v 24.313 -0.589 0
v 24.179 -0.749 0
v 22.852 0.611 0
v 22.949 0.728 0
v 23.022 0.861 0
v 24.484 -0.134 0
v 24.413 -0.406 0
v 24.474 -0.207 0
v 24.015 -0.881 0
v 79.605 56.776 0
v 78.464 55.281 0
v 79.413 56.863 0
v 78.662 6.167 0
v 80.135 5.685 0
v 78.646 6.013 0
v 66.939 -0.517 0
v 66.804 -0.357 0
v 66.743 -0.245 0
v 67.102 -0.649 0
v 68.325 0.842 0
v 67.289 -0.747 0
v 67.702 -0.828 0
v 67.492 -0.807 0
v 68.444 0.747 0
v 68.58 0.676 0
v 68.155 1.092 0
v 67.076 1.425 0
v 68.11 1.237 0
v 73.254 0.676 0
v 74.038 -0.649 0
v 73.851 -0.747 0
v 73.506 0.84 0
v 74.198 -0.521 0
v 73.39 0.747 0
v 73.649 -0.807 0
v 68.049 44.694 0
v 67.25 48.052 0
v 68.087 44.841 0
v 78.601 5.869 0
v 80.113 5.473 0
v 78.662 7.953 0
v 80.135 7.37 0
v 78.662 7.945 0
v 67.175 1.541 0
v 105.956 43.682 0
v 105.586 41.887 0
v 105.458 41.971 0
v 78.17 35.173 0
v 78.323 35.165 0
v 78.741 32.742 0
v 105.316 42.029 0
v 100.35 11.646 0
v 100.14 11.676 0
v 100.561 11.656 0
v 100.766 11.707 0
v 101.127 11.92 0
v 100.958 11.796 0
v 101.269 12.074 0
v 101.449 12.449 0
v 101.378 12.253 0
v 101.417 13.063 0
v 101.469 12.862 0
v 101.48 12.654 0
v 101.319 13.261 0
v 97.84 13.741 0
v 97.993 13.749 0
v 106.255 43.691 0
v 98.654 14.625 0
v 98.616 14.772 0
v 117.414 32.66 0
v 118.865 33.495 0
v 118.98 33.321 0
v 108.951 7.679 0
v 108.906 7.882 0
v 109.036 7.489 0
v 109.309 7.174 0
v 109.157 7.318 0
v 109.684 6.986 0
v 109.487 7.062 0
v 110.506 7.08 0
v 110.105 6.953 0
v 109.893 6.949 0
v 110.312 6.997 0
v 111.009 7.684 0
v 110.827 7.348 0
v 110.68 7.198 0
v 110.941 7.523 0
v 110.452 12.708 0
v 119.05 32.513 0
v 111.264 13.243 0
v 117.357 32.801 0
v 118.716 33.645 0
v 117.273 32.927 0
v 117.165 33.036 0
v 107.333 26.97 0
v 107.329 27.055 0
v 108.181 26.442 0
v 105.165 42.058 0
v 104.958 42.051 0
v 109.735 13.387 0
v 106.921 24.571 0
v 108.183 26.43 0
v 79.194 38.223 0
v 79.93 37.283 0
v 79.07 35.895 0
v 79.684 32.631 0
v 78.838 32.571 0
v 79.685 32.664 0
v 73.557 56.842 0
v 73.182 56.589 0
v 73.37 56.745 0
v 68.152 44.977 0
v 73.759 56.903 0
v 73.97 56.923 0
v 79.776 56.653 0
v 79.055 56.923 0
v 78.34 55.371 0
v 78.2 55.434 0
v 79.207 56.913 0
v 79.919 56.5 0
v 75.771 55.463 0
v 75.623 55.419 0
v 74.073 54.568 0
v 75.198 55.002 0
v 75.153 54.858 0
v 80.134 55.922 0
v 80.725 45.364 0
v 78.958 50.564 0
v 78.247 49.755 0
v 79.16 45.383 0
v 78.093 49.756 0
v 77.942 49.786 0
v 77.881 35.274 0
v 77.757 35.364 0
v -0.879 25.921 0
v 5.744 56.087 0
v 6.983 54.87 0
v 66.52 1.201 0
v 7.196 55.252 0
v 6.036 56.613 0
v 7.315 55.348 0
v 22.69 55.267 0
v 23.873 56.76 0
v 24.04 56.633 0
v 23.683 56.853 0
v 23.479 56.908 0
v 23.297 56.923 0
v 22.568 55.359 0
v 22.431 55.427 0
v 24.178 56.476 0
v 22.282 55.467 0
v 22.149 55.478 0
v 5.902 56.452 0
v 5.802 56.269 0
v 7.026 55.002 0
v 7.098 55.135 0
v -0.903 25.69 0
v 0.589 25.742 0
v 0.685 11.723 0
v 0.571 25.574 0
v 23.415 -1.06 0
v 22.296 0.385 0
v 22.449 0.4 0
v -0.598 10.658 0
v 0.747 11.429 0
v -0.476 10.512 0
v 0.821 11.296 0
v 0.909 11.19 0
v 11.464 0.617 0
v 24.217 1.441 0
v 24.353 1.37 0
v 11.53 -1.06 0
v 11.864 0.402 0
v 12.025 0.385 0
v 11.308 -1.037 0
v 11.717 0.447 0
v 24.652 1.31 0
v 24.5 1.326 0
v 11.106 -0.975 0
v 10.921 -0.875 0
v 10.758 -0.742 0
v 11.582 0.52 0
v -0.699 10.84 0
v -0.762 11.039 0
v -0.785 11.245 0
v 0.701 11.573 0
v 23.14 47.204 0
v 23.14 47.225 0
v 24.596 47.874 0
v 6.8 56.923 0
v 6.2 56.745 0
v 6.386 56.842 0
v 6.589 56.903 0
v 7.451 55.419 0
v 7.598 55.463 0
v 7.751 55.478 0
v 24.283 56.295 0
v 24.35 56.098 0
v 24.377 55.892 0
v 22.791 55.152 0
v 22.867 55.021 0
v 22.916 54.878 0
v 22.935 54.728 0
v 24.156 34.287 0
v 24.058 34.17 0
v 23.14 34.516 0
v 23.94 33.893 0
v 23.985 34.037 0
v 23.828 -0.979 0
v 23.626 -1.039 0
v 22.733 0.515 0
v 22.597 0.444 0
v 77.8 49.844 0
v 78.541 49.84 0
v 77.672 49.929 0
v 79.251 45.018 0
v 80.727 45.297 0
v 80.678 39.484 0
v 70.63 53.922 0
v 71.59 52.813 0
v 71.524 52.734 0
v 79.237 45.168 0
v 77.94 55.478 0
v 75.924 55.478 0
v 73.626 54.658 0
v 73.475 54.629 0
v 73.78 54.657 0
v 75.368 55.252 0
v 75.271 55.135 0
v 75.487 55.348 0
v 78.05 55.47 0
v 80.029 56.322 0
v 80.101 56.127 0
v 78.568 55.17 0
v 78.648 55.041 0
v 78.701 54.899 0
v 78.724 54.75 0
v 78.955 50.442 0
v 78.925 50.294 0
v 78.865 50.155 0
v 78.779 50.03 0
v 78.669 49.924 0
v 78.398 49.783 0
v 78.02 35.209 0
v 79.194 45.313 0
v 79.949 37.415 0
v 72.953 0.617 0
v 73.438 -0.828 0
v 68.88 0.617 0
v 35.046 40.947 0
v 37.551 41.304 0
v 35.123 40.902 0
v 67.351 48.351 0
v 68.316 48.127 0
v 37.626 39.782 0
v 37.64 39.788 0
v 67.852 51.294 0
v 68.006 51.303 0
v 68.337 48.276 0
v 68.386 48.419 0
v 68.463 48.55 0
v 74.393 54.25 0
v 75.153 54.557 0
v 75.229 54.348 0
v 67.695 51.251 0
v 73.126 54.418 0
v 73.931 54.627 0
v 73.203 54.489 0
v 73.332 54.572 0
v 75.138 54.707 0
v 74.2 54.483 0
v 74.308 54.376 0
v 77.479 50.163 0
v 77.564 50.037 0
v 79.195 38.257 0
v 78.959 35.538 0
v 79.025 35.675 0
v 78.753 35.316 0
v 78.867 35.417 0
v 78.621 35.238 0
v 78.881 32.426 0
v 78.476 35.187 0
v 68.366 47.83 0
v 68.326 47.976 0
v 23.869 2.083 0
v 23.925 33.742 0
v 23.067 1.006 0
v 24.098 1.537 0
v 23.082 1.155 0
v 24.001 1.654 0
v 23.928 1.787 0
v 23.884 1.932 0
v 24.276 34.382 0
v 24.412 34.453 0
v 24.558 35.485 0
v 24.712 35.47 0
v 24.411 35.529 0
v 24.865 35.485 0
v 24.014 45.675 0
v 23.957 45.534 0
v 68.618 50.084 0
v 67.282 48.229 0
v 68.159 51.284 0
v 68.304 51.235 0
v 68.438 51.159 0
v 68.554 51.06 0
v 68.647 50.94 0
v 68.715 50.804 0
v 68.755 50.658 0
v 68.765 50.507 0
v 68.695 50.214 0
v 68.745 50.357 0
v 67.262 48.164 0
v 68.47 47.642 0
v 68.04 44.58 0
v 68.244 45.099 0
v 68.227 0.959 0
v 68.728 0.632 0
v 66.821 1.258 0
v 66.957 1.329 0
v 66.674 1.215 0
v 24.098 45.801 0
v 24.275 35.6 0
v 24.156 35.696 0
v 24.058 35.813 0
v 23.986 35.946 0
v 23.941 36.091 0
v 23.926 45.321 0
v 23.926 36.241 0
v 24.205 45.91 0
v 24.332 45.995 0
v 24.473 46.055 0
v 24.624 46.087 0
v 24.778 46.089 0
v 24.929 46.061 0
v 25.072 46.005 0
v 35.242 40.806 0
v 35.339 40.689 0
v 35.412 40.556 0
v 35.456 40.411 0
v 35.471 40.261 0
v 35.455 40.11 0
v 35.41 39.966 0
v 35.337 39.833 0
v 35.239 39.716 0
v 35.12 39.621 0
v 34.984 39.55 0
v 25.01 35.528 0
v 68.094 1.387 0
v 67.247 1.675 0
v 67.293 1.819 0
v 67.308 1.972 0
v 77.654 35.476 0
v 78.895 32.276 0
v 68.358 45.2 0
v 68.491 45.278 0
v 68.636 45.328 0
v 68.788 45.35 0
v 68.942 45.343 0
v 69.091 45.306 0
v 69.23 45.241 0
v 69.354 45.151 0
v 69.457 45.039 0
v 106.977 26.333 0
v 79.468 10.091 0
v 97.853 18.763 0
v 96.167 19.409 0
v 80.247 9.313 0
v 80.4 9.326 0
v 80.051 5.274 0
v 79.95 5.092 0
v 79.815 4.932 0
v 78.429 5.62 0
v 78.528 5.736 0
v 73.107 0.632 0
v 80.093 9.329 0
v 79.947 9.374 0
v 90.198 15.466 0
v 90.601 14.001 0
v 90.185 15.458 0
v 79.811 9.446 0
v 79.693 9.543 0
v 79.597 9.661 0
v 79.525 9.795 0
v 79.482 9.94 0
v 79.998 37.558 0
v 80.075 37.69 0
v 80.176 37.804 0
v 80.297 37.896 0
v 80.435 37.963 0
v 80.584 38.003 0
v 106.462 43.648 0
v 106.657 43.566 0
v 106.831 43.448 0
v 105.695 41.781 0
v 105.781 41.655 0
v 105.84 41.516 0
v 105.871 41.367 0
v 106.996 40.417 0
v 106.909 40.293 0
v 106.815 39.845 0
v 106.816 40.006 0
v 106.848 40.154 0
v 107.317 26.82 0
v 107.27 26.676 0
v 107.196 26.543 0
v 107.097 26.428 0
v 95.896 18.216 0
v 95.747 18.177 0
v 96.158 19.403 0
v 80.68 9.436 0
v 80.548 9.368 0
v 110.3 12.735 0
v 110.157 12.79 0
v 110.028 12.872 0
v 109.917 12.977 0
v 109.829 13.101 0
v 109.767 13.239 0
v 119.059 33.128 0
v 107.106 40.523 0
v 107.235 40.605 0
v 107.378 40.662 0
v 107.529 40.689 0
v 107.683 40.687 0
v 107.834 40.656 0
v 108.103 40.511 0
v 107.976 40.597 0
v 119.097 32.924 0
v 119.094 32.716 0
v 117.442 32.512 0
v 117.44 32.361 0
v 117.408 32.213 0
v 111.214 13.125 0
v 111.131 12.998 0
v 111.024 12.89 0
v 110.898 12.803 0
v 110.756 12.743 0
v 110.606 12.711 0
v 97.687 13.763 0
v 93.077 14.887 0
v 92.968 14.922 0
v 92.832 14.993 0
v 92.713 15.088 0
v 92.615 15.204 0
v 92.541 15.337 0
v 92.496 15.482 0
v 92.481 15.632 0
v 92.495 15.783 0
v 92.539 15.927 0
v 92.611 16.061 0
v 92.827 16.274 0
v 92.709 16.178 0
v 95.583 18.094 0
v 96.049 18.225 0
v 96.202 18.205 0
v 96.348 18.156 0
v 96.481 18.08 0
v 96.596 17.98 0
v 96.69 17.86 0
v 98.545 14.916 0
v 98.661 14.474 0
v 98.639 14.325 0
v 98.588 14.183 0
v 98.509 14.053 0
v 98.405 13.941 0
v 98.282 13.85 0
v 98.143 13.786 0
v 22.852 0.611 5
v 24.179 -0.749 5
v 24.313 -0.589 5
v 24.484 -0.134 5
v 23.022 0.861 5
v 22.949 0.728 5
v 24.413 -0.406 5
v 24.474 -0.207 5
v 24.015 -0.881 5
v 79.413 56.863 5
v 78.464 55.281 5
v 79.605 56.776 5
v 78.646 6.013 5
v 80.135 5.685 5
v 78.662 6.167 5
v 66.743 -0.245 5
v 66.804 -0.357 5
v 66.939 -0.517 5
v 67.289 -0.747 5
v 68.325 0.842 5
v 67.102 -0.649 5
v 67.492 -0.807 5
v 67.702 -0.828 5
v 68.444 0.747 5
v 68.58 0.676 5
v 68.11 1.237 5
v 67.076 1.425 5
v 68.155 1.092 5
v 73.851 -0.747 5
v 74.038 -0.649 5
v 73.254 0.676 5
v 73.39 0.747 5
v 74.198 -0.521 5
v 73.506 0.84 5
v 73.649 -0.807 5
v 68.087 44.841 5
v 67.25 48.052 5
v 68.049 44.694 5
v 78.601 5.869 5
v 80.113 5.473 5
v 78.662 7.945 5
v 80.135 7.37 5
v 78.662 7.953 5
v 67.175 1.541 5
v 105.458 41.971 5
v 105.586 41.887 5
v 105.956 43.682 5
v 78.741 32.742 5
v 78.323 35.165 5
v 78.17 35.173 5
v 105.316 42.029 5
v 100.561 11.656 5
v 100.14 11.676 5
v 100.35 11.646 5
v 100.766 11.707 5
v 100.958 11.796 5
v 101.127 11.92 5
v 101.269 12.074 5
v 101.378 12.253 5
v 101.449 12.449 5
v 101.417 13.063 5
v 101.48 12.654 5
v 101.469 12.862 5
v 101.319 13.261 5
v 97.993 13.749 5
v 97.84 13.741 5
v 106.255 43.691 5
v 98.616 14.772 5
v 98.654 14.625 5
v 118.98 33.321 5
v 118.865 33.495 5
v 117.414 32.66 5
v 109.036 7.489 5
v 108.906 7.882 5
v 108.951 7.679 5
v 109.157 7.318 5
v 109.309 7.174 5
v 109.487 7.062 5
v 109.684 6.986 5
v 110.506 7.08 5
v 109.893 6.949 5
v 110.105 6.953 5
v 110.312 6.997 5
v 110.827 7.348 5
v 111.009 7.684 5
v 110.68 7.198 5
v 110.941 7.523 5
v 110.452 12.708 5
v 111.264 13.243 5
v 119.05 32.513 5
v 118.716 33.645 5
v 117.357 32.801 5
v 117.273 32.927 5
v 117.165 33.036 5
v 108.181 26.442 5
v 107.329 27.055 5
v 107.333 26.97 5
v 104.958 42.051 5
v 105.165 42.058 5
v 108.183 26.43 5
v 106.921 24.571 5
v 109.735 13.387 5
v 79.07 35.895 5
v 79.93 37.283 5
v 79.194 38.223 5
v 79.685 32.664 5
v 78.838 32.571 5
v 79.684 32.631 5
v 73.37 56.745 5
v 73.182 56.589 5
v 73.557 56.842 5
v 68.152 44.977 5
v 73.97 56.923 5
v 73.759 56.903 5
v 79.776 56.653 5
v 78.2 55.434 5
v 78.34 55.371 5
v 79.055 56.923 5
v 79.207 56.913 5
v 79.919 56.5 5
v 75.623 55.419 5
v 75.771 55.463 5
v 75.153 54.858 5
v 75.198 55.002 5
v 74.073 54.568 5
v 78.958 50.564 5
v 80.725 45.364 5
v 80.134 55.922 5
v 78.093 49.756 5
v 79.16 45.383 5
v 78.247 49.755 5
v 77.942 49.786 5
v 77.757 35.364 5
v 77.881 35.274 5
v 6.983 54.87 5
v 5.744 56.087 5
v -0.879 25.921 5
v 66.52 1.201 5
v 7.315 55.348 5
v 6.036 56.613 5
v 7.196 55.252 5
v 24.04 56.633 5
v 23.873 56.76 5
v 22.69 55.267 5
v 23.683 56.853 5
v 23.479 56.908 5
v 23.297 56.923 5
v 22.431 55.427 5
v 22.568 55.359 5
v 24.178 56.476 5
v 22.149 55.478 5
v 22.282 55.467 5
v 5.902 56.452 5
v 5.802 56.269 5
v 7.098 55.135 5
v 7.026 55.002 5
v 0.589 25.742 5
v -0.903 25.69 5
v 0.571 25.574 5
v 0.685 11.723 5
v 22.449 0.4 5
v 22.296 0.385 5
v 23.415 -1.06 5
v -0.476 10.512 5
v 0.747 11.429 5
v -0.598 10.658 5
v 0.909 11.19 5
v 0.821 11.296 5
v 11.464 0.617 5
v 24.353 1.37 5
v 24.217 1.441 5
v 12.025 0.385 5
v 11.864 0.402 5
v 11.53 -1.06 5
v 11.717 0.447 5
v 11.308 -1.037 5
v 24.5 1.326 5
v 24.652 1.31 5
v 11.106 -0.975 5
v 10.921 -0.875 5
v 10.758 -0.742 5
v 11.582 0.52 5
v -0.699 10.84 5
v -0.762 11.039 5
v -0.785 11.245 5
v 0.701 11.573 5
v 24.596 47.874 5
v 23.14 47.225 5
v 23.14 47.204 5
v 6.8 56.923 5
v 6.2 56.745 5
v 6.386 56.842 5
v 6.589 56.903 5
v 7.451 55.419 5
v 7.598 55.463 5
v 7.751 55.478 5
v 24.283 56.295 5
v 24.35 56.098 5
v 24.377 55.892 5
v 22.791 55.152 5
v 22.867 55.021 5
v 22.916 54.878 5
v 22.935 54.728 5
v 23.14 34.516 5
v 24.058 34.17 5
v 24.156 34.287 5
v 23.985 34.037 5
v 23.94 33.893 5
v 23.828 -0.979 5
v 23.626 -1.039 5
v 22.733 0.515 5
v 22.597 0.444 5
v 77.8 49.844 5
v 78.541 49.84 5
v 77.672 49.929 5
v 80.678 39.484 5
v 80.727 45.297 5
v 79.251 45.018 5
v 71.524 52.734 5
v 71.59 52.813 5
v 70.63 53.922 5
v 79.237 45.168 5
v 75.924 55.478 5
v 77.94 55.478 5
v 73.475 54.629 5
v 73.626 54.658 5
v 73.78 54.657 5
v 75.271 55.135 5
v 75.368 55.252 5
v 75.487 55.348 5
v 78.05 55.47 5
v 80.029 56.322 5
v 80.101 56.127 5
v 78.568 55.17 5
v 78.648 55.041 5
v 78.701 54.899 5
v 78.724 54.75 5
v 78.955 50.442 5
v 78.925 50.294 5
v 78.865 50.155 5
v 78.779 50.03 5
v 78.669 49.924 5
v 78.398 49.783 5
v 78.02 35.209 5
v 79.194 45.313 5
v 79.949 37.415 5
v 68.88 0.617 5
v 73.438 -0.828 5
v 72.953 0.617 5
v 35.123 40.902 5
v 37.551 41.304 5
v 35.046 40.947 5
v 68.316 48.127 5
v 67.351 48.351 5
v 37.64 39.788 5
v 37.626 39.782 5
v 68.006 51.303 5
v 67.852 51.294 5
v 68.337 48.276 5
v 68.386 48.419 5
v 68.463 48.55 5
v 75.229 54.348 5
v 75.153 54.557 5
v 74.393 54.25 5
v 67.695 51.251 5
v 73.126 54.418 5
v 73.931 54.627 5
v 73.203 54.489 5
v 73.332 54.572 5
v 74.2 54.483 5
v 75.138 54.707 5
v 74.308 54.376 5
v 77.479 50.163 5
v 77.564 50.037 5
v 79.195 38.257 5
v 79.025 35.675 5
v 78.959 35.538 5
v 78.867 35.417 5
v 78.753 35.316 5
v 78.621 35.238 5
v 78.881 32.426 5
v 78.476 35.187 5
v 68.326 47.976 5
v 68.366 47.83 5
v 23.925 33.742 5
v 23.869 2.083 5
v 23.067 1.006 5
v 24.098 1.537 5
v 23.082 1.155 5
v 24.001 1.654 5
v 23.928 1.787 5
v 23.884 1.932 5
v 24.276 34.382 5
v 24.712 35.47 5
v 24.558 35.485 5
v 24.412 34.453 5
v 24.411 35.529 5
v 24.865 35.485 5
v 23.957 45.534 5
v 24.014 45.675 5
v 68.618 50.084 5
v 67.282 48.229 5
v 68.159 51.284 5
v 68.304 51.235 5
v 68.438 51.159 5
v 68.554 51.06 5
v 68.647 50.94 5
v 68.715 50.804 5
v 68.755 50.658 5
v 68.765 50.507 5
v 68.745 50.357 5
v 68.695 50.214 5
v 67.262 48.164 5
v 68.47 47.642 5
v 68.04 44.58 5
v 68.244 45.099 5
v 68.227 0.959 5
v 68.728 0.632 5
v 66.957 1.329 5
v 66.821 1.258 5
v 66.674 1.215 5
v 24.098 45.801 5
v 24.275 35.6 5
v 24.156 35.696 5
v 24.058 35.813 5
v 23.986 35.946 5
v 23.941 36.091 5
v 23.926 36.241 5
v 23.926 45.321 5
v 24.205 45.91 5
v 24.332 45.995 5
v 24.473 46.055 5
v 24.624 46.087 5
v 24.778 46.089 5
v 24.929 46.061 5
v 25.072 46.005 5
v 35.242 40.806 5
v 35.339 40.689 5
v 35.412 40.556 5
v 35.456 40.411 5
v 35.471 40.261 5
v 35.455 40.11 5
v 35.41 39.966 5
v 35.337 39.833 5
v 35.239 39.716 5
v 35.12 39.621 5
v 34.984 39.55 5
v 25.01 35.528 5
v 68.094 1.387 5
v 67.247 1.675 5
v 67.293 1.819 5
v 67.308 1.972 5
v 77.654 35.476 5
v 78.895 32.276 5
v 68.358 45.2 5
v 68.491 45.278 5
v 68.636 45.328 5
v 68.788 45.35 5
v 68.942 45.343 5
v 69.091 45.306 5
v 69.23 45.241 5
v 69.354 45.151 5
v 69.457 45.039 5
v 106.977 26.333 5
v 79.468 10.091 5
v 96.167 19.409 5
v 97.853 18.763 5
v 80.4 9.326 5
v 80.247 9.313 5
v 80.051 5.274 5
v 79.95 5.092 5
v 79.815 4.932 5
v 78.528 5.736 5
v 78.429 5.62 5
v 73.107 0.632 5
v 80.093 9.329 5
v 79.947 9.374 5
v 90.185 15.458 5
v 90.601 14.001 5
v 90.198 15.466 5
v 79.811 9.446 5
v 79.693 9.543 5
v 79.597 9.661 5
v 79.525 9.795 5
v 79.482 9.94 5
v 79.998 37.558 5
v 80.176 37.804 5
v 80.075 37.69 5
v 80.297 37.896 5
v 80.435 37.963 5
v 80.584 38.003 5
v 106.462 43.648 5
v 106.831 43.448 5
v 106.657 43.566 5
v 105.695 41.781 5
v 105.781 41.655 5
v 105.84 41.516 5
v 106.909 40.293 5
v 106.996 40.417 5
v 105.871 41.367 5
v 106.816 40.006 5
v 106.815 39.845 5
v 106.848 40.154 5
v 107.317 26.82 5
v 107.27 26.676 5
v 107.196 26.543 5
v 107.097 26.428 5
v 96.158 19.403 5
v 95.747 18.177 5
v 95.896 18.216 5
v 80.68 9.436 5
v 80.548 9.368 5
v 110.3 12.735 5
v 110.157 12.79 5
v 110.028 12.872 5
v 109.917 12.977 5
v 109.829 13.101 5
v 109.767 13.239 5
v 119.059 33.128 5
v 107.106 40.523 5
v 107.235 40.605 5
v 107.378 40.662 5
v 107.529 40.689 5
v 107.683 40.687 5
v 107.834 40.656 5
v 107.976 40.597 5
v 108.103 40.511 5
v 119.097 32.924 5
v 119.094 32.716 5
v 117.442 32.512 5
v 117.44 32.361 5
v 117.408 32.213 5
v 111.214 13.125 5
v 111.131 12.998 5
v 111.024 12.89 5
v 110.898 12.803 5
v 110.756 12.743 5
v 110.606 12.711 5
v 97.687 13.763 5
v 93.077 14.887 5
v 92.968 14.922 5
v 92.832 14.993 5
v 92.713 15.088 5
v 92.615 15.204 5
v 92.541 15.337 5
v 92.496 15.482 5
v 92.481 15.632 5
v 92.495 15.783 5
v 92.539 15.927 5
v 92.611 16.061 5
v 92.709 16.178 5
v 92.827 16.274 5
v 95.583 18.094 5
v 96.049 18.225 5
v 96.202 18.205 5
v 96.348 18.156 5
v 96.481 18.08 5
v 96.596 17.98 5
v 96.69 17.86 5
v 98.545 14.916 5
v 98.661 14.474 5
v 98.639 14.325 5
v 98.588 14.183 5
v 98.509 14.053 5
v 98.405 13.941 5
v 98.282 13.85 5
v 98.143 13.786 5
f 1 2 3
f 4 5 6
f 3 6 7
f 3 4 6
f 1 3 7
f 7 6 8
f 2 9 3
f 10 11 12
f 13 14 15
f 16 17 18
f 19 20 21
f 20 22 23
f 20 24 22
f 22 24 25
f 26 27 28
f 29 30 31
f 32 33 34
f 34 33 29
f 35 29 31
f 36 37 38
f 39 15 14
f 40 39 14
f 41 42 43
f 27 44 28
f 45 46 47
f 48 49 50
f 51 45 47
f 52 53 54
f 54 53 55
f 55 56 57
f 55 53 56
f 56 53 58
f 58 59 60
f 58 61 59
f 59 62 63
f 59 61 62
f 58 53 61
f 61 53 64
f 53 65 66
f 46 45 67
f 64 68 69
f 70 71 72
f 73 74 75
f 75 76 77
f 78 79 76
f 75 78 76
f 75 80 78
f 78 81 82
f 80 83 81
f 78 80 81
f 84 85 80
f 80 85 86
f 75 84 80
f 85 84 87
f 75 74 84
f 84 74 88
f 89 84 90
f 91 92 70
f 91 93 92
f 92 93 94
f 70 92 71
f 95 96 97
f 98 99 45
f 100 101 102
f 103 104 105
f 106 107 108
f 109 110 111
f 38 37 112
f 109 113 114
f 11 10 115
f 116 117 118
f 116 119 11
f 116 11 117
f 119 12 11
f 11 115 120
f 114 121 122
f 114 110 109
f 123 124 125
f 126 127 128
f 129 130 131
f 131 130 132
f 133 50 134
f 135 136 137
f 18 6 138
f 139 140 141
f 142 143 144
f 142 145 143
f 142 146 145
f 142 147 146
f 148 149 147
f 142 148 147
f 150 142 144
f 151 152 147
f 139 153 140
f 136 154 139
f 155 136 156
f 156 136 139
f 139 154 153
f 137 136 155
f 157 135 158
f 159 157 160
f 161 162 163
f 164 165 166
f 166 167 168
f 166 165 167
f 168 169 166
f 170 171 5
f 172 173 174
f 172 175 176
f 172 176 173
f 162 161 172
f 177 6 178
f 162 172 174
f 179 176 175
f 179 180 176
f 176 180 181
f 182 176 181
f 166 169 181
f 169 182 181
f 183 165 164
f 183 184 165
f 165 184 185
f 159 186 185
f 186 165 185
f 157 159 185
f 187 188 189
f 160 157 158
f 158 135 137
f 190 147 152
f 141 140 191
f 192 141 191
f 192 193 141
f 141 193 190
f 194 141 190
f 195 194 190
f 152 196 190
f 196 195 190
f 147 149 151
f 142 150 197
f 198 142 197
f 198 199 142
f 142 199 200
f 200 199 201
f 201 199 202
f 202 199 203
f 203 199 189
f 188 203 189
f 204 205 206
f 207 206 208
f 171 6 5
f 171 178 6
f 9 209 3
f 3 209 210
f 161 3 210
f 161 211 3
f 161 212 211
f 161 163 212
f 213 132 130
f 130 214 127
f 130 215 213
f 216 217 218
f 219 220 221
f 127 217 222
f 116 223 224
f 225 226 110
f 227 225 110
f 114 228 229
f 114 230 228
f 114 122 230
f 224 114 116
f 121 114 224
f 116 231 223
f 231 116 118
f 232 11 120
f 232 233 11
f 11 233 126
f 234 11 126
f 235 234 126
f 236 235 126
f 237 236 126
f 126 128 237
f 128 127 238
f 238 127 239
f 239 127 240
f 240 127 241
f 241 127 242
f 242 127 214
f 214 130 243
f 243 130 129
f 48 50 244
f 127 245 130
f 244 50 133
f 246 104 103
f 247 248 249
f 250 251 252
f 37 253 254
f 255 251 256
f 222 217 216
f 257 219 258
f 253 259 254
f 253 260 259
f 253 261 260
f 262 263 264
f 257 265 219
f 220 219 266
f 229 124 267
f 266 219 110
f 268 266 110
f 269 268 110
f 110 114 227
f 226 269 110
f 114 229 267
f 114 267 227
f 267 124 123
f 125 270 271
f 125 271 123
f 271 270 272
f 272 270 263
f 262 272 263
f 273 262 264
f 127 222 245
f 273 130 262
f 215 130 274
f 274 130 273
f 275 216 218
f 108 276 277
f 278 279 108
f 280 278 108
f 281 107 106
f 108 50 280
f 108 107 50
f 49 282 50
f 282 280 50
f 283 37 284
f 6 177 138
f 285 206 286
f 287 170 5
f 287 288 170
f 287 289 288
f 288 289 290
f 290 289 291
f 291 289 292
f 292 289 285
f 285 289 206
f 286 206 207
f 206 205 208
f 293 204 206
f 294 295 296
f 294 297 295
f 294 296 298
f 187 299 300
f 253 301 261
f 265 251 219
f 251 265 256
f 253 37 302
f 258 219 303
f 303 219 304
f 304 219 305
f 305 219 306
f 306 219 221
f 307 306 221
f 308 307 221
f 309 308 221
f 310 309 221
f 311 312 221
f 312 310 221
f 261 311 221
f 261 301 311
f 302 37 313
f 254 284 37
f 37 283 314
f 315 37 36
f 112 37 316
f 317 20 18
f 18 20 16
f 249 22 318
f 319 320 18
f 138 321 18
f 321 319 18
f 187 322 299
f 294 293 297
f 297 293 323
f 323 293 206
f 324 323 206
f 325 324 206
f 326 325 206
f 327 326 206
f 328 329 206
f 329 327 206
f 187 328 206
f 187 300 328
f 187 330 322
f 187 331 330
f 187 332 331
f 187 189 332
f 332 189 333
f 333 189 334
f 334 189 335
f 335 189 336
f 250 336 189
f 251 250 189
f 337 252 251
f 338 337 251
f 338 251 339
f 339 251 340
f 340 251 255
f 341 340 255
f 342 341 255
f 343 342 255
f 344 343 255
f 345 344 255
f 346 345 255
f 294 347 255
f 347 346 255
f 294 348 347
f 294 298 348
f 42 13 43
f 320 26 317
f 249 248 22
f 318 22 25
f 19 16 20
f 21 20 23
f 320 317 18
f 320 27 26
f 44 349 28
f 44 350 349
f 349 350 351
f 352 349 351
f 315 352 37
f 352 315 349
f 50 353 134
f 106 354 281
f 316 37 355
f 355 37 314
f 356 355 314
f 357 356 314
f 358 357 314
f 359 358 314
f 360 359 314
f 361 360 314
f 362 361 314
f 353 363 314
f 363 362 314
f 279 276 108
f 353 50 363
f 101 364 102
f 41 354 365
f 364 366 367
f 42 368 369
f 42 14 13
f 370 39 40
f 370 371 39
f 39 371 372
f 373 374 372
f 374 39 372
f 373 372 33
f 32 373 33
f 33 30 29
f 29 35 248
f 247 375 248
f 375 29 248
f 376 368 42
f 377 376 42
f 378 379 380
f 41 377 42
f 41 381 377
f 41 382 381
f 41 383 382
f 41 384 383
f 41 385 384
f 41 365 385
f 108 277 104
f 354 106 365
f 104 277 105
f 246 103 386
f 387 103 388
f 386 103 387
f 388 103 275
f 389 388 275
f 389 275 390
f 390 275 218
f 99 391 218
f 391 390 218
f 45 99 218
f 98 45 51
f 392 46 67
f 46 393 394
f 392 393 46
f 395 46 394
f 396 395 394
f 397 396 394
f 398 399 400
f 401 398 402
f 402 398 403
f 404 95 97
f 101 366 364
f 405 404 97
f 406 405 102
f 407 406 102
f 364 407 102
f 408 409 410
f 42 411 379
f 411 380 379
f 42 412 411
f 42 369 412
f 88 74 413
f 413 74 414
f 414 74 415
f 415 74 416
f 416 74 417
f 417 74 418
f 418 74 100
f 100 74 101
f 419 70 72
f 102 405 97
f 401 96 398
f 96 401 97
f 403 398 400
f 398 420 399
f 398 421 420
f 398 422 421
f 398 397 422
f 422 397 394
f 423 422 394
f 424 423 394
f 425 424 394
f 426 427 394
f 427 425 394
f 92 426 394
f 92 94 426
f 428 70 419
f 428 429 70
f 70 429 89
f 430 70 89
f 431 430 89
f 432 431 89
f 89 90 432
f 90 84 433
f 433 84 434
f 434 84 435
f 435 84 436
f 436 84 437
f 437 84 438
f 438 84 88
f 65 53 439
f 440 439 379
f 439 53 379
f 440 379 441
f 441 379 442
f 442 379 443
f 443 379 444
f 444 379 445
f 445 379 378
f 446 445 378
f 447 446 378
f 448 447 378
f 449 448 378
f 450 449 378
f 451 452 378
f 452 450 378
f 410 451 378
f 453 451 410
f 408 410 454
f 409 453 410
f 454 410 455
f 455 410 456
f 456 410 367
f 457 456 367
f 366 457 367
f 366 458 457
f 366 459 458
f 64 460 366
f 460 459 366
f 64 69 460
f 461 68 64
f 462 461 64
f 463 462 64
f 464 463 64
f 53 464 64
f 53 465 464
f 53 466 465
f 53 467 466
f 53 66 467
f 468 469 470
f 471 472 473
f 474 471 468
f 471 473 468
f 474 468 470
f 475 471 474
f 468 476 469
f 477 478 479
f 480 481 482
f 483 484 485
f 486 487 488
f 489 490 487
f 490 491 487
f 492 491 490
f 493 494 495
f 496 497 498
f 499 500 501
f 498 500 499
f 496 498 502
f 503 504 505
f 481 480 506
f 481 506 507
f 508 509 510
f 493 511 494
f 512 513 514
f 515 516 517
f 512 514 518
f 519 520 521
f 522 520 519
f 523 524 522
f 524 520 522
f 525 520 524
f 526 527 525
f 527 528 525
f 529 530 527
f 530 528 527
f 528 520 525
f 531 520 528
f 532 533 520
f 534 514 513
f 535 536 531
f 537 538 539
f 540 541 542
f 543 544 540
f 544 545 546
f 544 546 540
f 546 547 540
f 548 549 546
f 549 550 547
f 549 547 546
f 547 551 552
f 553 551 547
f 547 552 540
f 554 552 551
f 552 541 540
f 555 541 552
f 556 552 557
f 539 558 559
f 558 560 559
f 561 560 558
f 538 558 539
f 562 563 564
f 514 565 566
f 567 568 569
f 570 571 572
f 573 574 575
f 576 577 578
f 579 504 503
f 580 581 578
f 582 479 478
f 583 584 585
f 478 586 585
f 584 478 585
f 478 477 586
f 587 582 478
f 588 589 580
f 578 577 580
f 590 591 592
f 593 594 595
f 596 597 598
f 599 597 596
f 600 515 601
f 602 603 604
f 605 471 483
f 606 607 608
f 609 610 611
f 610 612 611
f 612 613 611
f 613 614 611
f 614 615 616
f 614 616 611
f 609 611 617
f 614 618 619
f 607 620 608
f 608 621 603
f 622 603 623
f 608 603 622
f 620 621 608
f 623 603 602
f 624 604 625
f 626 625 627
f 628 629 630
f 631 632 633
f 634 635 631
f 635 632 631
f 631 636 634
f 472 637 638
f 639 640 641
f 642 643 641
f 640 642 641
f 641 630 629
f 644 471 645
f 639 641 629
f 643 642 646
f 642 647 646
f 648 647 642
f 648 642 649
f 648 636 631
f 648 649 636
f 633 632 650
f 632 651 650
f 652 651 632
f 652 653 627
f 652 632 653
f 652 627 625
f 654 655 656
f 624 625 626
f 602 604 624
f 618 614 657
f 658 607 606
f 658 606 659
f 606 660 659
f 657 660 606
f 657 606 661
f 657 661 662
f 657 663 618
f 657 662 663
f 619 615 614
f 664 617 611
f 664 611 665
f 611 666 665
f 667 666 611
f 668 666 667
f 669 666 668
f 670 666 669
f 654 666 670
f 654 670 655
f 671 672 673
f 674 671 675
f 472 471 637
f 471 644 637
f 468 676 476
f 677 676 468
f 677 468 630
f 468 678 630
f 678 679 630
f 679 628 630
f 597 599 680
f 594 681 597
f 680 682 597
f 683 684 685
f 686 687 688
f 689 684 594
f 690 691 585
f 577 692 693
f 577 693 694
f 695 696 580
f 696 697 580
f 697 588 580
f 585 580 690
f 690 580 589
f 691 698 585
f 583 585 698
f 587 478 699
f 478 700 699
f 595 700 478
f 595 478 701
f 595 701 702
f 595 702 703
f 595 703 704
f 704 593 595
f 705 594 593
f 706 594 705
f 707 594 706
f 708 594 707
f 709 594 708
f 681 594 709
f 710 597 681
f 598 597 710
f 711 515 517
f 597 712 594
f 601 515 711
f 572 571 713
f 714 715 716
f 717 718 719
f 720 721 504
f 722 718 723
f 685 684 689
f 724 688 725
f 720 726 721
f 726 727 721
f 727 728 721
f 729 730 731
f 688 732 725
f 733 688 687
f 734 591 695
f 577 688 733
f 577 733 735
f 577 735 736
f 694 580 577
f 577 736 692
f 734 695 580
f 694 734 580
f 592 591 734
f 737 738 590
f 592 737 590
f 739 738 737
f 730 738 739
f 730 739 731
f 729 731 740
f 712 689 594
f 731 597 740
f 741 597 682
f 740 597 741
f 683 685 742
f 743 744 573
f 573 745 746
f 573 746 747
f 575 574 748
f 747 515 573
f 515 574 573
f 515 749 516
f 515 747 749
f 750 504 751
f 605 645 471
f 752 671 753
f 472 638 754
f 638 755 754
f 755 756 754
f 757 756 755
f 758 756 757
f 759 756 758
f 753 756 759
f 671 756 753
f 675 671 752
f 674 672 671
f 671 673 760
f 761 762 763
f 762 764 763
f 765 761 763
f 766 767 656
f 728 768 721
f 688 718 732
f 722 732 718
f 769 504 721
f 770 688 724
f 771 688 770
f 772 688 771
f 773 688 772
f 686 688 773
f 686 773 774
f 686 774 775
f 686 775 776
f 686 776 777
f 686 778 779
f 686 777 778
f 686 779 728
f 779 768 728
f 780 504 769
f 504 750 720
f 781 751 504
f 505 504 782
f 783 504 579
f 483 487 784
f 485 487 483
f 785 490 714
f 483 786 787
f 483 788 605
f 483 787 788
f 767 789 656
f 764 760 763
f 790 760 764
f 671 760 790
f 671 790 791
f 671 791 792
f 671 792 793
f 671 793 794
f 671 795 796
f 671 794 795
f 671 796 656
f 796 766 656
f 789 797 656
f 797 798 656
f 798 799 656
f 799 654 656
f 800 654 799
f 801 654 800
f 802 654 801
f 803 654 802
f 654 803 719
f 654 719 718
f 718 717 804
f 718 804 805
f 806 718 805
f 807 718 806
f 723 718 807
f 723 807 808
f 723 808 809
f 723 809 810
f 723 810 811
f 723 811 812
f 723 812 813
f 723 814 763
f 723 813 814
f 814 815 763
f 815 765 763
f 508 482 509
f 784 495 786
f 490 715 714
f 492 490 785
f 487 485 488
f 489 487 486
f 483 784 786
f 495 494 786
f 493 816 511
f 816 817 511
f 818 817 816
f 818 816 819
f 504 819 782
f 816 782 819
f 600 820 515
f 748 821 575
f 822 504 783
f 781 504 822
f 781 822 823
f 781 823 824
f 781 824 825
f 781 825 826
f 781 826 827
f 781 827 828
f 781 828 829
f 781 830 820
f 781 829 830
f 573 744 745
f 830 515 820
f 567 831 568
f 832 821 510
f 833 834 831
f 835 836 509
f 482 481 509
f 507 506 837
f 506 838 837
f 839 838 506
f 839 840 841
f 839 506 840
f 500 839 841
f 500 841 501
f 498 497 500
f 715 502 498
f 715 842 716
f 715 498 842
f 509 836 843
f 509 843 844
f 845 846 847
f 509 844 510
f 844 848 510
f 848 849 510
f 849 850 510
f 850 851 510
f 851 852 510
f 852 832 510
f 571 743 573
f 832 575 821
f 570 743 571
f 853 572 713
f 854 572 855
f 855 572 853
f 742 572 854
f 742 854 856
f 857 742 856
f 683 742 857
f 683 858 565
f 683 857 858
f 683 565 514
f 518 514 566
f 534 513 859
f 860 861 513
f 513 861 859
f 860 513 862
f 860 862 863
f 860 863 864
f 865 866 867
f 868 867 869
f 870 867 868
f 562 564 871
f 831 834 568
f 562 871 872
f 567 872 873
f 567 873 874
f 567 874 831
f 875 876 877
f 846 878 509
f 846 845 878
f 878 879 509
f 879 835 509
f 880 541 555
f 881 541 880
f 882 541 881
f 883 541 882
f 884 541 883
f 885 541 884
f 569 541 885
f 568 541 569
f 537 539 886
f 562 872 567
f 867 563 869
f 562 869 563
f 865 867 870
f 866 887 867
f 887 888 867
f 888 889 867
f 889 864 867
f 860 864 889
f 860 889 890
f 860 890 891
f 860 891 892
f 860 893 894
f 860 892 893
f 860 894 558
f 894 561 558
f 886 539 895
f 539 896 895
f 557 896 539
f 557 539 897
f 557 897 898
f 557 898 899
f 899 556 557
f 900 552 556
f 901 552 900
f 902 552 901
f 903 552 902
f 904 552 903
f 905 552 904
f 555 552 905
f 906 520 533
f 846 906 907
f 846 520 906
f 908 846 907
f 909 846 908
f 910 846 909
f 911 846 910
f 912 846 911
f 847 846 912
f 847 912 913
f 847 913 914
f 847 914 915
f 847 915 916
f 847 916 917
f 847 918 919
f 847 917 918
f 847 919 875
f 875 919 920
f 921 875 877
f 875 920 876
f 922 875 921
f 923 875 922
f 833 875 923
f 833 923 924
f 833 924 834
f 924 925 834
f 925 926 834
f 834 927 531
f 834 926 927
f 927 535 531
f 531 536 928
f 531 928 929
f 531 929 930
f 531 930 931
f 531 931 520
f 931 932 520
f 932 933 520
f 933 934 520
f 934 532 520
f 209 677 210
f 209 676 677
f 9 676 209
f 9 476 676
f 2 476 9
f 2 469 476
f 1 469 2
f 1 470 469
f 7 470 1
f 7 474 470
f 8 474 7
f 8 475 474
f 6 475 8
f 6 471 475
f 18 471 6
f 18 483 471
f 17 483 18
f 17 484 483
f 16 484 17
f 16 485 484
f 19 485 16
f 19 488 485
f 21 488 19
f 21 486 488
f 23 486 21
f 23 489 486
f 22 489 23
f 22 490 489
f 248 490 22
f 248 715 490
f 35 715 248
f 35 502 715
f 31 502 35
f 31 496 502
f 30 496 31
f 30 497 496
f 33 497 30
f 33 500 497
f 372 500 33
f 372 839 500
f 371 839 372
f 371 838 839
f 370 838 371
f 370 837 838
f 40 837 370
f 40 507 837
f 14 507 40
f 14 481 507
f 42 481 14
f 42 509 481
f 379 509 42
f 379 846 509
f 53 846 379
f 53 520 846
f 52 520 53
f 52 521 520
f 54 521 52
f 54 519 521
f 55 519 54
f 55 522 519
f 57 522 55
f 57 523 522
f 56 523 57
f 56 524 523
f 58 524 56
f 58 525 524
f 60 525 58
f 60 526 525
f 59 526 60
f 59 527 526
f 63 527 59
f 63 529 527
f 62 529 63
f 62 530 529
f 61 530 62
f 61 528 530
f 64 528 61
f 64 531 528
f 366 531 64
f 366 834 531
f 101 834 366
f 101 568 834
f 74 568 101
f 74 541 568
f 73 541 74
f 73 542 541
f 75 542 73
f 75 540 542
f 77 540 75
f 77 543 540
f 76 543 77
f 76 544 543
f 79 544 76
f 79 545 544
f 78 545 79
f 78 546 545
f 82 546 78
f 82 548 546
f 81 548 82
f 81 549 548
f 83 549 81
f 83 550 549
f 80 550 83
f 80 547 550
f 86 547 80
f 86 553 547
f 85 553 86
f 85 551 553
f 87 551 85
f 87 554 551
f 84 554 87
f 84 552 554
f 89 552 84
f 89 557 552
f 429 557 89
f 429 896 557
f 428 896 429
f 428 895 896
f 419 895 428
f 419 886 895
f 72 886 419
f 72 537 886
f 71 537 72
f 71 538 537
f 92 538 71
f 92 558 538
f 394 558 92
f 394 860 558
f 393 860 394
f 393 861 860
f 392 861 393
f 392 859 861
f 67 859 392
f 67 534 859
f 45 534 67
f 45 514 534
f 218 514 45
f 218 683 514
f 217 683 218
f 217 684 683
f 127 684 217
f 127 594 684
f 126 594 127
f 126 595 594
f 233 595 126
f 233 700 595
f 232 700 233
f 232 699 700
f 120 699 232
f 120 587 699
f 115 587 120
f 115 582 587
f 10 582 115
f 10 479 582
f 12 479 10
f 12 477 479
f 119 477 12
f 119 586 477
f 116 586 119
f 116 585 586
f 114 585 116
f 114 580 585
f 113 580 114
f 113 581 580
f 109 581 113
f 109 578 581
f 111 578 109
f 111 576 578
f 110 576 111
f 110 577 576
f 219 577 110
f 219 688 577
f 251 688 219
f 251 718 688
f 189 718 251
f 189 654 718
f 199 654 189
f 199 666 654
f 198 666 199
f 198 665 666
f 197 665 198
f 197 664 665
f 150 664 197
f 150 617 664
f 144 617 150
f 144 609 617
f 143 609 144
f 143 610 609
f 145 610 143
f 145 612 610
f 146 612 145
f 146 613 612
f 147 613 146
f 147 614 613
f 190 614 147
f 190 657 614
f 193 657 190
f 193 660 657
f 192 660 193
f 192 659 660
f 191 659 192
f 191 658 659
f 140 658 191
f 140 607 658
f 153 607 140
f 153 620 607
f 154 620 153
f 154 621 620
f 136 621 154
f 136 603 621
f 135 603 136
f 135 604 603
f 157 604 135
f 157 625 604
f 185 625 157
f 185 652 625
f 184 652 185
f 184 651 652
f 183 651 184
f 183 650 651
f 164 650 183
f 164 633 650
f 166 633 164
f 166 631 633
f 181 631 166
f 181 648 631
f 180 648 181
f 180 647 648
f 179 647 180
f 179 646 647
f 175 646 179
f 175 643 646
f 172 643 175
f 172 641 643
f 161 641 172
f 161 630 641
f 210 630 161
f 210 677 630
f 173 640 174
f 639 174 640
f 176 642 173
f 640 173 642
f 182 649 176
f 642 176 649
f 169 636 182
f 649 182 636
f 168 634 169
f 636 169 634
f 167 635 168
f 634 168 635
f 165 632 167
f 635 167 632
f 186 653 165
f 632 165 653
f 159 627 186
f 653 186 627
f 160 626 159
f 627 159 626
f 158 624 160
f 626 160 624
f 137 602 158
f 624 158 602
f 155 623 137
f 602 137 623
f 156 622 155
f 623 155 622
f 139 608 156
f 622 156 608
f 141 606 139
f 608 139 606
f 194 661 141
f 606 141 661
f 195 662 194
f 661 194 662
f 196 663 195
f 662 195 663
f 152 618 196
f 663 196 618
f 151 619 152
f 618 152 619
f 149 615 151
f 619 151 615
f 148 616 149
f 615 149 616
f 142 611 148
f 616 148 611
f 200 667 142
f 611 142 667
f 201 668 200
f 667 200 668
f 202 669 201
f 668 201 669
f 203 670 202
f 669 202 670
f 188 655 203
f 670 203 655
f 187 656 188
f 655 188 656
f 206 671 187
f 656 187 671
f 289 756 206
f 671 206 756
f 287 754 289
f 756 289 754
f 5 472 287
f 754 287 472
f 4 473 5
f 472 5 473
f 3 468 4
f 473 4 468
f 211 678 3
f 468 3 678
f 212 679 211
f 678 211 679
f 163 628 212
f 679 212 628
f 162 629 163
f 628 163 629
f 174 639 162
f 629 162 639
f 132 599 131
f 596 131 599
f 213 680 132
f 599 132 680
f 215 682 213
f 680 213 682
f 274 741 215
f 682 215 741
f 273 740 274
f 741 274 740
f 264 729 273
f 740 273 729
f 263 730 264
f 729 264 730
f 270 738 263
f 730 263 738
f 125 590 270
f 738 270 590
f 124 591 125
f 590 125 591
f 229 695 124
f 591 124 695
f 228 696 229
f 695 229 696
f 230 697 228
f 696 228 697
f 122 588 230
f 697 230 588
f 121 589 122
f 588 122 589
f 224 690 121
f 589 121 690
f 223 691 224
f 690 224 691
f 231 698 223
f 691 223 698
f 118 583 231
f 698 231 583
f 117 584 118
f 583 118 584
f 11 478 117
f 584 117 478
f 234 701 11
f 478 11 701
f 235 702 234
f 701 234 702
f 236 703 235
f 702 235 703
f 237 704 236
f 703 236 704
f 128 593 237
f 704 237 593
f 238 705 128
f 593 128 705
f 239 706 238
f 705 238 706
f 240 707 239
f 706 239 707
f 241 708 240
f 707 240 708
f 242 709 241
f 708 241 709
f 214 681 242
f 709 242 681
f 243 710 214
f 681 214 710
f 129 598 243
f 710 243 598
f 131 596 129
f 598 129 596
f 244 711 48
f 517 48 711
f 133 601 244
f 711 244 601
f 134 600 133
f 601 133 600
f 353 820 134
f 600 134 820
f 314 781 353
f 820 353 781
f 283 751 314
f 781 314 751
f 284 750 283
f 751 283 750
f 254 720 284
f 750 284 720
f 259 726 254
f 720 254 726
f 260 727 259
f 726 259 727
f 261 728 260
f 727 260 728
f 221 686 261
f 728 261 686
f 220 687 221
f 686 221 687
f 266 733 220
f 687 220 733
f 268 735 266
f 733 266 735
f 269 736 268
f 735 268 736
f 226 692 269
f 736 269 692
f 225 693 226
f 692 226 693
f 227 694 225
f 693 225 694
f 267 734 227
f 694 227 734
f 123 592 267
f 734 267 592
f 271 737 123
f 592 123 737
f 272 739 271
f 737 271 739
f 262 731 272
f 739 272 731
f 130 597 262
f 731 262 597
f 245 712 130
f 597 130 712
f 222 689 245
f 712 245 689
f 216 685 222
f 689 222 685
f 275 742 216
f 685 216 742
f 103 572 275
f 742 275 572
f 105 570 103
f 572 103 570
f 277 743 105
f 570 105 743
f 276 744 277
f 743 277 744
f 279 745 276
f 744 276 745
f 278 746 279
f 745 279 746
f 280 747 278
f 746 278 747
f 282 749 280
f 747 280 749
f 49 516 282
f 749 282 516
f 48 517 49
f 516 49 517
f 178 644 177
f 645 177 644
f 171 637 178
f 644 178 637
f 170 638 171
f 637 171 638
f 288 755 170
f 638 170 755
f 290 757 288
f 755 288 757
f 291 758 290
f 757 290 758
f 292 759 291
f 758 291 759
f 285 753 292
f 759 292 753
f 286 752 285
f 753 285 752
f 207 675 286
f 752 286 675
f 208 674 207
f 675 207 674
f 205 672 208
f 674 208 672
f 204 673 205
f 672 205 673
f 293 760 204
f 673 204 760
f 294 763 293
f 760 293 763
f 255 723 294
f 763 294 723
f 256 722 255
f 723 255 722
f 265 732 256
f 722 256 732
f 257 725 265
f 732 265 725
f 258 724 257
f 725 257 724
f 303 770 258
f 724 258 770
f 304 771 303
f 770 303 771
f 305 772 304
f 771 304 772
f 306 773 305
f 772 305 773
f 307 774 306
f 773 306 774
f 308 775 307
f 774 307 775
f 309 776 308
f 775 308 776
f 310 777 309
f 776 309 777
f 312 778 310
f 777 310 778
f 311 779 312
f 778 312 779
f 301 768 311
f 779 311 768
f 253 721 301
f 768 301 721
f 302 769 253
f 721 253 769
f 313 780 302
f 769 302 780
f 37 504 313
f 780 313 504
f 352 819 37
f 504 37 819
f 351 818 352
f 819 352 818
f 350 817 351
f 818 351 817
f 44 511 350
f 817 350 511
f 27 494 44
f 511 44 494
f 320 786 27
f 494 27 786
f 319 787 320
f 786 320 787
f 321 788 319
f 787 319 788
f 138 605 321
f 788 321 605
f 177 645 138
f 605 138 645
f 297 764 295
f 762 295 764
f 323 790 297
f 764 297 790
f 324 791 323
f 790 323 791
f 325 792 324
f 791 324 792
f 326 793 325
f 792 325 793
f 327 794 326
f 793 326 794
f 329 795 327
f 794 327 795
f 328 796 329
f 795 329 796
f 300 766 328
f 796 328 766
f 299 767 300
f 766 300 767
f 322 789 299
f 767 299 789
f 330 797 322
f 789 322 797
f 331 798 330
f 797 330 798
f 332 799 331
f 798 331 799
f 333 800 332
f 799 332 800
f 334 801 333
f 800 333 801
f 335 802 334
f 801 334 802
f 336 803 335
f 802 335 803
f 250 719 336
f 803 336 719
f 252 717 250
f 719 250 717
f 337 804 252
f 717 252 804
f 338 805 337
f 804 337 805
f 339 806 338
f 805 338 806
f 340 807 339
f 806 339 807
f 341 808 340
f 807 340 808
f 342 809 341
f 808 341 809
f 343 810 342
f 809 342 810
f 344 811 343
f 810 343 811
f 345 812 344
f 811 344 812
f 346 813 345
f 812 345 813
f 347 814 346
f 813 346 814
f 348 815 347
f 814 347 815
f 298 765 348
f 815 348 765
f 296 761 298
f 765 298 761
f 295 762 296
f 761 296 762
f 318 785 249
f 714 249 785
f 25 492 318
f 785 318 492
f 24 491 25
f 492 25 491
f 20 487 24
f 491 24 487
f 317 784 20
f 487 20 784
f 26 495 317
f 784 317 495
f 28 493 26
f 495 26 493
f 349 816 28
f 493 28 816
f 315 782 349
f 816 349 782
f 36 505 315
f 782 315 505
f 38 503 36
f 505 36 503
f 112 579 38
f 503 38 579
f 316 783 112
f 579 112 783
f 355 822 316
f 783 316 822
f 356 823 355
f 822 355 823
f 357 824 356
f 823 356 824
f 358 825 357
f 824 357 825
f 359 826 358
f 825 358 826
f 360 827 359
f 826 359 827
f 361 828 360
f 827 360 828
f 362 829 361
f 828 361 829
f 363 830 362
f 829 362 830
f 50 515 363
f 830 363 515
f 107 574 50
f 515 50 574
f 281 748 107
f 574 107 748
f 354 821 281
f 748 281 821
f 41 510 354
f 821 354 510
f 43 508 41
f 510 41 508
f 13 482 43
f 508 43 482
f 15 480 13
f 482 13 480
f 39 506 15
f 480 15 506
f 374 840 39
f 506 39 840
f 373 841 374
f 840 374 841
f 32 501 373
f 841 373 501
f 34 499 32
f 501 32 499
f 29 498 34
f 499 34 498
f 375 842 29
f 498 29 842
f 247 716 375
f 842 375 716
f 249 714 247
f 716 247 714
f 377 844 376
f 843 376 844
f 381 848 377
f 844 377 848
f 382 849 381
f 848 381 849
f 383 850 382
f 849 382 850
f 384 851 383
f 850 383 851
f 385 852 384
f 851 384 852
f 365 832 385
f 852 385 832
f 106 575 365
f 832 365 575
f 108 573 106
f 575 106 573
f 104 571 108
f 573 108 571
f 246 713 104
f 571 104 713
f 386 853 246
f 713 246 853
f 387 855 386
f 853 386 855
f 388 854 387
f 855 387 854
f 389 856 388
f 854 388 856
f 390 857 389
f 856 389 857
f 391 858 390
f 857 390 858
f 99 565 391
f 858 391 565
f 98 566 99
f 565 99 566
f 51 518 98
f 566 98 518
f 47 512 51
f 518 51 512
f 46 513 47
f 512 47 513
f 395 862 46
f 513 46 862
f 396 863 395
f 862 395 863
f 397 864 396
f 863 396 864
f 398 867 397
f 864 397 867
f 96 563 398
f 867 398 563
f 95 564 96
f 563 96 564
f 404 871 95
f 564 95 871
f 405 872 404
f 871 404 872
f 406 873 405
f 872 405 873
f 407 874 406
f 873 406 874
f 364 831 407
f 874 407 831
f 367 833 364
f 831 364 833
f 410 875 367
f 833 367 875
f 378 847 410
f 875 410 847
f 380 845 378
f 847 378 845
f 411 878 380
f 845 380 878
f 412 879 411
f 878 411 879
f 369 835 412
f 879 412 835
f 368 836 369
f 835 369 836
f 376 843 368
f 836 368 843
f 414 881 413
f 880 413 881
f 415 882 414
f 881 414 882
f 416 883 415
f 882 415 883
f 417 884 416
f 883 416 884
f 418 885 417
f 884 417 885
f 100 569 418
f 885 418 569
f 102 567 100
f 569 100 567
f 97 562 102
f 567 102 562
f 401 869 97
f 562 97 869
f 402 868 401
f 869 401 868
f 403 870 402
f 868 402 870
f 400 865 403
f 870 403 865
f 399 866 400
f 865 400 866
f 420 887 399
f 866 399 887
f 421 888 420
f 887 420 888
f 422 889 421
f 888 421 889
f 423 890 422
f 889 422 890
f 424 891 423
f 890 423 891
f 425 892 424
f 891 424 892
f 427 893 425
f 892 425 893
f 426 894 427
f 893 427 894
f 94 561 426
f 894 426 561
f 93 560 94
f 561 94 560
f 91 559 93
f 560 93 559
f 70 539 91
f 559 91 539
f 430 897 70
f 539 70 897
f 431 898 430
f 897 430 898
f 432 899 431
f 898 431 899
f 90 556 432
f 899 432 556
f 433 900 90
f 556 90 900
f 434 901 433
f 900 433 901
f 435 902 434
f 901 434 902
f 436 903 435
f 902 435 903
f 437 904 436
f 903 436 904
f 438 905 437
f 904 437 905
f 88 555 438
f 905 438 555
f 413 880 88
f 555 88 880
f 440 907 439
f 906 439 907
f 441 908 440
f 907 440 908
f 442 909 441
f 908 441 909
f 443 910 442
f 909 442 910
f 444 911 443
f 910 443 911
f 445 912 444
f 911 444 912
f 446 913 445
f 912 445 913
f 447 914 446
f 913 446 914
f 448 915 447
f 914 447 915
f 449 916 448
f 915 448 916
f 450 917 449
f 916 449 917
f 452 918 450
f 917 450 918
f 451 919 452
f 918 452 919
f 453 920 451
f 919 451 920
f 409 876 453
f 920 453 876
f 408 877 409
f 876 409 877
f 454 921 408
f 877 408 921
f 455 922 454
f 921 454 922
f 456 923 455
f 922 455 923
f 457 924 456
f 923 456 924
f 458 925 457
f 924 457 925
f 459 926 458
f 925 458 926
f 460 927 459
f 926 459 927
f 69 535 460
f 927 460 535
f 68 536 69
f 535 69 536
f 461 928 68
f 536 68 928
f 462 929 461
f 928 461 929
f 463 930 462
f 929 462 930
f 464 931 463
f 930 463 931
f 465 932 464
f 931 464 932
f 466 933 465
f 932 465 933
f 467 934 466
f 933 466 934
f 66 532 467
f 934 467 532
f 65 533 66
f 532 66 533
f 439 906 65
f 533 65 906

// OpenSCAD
/*
 * Customizable Origami - Rhino - https://www.thingiverse.com/thing:2721242
 * by Dennis Hofmann - https://www.thingiverse.com/mightynozzle/about
 * created 2017-12-18
 * version v1.0
 *
 * Changelog
 * --------------
 * v1.0:
 *      - final design
 * --------------
 * 
 * This work is licensed under the Creative Commons - Attribution - NonCommercial - ShareAlike license.
 * https://creativecommons.org/licenses/by-nc-sa/3.0/
 */


 // Parameter Section //
//-------------------//

// preview[view:north, tilt:top]

// The maximum size of the longest side. The shorter side will be automatically resized in same ratio.
max_size_in_millimeter = 120; //[20:300]

// The height of the model.
model_height_in_millimeter = 5; //[0.2:0.2:100]

// Thickness of the outer outline.
outline_size_in_millimeter = 1.5; //[0.5:0.1:20]

// Thickness of the inner outline.
inline_size_in_millimeter = 0.8; //[0.5:0.1:20]

// Roundiness of the ends of the inner outlines.
inline_edge_radius_in_millimeter = 0.8; //[0.0:0.1:5]

// Flip model
flip_model = "no"; //[yes,no]

/*[hidden]*/
max_size = max_size_in_millimeter;
model_height = model_height_in_millimeter;
$fn=32;

// Outer Points
A1 = [5, 194];
A2 = [195, 0];
A3 = [396, 0];
A4 = [397, 16];
A5 = [1145, 14];
A6 = [1145, 4];
A7 = [1242, 4];
A8 = [1337, 98];
A9 = [1337, 137];
A10 = [1529, 261];
A11 = [1698, 219];
A12 = [1630, 329];
A13 = [1823, 455];
A14 = [1860, 138];
A15 = [1996, 566];
A16 = [1795, 735];
A17 = [1346, 659];
A18 = [1347, 781];
A19 = [1337, 963];
A20 = [1251, 963];
A21 = [1205, 914];
A22 = [634, 692];
A23 = [398, 814];
A24 = [394, 963];
A25 = [115, 963];
A26 = [3, 443];

outline = [A1, A2, A3, A4, A5, A6, A7, A8, A9, A10, A11, A12, A13, A14, A15, A16, A17, A18, A19, A20, A21, A22, A23, A24, A25, A26];

// Inner Points
B1 = [398, 595];
B2 = [1144, 829];
B3 = [1341, 563];

// Polygons
C1 = [A25, A26, A1, A2, A3, A4, B1, A23, A24];
C2 = [B1, A22, A23];
C3 = [A4, A5, B2, A21, A22, B1];
C4 = [A6, A7, A8, A9, B3, B2, A5];
C5 = [A9, A10, A12, A13, A16, A17, B3];
C6 = [A10, A11, A12];
C7 = [A14, A15, A16, A13];
C8 = [B3, B2, A21, A20, A18, A17];
C9 = [A18, A20, A19];

cut_polygons = [C1, C2, C3, C4, C5, C6, C7, C8, C9];

min_x = A26[0];
min_y = A2[1];
max_x = A15[0];
max_y = A24[1];

x_size = max_x - min_x;
y_size = max_y - min_y;

x_factor = max_size / x_size;
y_factor = max_size / y_size;

inline_size = x_size > y_size ? inline_size_in_millimeter / x_factor / 2: inline_size_in_millimeter / y_factor / 2;
inline_edge_radius = x_size > y_size ? inline_edge_radius_in_millimeter / x_factor: inline_edge_radius_in_millimeter / y_factor;
outline_size = x_size > y_size ? outline_size_in_millimeter / x_factor - inline_size: outline_size_in_millimeter / y_factor - inline_size;


 // Program Section //
//-----------------//

if(x_size > y_size) {
    resize(newsize=[max_size, x_factor * y_size, model_height]){
        if(flip_model == "yes") {
            mirror([0,1,0]) {
                rotate([180,180,0]) {    
                    create(outline, cut_polygons);
                }
            }
        } else {
            create(outline, cut_polygons);
        }
    }
} else {
    resize(newsize=[y_factor * x_size, max_size, model_height]){
        if(flip_model == "yes") {
            mirror([0,1,0]) {
                rotate([180,180,0]) {    
                    create(outline, cut_polygons);
                }
            }
        } else {
            create(outline, cut_polygons);
        }
    }
}


 // Module Section //
//----------------//

module create() {
    linear_extrude(height=1) {
        difference() {
            offset(r = -0) {
                offset(r = +outline_size) {
                    polygon(points = outline, convexity = 10);
                }
            }
            
            for(cut_polygon = [0:len(cut_polygons)]) {
                offset(r = +inline_edge_radius) {
                    offset(r = -inline_size - inline_edge_radius) {
                        polygon(points = cut_polygons[cut_polygon], convexity = 10);
                    }
                }
            }
        }
    }
}
